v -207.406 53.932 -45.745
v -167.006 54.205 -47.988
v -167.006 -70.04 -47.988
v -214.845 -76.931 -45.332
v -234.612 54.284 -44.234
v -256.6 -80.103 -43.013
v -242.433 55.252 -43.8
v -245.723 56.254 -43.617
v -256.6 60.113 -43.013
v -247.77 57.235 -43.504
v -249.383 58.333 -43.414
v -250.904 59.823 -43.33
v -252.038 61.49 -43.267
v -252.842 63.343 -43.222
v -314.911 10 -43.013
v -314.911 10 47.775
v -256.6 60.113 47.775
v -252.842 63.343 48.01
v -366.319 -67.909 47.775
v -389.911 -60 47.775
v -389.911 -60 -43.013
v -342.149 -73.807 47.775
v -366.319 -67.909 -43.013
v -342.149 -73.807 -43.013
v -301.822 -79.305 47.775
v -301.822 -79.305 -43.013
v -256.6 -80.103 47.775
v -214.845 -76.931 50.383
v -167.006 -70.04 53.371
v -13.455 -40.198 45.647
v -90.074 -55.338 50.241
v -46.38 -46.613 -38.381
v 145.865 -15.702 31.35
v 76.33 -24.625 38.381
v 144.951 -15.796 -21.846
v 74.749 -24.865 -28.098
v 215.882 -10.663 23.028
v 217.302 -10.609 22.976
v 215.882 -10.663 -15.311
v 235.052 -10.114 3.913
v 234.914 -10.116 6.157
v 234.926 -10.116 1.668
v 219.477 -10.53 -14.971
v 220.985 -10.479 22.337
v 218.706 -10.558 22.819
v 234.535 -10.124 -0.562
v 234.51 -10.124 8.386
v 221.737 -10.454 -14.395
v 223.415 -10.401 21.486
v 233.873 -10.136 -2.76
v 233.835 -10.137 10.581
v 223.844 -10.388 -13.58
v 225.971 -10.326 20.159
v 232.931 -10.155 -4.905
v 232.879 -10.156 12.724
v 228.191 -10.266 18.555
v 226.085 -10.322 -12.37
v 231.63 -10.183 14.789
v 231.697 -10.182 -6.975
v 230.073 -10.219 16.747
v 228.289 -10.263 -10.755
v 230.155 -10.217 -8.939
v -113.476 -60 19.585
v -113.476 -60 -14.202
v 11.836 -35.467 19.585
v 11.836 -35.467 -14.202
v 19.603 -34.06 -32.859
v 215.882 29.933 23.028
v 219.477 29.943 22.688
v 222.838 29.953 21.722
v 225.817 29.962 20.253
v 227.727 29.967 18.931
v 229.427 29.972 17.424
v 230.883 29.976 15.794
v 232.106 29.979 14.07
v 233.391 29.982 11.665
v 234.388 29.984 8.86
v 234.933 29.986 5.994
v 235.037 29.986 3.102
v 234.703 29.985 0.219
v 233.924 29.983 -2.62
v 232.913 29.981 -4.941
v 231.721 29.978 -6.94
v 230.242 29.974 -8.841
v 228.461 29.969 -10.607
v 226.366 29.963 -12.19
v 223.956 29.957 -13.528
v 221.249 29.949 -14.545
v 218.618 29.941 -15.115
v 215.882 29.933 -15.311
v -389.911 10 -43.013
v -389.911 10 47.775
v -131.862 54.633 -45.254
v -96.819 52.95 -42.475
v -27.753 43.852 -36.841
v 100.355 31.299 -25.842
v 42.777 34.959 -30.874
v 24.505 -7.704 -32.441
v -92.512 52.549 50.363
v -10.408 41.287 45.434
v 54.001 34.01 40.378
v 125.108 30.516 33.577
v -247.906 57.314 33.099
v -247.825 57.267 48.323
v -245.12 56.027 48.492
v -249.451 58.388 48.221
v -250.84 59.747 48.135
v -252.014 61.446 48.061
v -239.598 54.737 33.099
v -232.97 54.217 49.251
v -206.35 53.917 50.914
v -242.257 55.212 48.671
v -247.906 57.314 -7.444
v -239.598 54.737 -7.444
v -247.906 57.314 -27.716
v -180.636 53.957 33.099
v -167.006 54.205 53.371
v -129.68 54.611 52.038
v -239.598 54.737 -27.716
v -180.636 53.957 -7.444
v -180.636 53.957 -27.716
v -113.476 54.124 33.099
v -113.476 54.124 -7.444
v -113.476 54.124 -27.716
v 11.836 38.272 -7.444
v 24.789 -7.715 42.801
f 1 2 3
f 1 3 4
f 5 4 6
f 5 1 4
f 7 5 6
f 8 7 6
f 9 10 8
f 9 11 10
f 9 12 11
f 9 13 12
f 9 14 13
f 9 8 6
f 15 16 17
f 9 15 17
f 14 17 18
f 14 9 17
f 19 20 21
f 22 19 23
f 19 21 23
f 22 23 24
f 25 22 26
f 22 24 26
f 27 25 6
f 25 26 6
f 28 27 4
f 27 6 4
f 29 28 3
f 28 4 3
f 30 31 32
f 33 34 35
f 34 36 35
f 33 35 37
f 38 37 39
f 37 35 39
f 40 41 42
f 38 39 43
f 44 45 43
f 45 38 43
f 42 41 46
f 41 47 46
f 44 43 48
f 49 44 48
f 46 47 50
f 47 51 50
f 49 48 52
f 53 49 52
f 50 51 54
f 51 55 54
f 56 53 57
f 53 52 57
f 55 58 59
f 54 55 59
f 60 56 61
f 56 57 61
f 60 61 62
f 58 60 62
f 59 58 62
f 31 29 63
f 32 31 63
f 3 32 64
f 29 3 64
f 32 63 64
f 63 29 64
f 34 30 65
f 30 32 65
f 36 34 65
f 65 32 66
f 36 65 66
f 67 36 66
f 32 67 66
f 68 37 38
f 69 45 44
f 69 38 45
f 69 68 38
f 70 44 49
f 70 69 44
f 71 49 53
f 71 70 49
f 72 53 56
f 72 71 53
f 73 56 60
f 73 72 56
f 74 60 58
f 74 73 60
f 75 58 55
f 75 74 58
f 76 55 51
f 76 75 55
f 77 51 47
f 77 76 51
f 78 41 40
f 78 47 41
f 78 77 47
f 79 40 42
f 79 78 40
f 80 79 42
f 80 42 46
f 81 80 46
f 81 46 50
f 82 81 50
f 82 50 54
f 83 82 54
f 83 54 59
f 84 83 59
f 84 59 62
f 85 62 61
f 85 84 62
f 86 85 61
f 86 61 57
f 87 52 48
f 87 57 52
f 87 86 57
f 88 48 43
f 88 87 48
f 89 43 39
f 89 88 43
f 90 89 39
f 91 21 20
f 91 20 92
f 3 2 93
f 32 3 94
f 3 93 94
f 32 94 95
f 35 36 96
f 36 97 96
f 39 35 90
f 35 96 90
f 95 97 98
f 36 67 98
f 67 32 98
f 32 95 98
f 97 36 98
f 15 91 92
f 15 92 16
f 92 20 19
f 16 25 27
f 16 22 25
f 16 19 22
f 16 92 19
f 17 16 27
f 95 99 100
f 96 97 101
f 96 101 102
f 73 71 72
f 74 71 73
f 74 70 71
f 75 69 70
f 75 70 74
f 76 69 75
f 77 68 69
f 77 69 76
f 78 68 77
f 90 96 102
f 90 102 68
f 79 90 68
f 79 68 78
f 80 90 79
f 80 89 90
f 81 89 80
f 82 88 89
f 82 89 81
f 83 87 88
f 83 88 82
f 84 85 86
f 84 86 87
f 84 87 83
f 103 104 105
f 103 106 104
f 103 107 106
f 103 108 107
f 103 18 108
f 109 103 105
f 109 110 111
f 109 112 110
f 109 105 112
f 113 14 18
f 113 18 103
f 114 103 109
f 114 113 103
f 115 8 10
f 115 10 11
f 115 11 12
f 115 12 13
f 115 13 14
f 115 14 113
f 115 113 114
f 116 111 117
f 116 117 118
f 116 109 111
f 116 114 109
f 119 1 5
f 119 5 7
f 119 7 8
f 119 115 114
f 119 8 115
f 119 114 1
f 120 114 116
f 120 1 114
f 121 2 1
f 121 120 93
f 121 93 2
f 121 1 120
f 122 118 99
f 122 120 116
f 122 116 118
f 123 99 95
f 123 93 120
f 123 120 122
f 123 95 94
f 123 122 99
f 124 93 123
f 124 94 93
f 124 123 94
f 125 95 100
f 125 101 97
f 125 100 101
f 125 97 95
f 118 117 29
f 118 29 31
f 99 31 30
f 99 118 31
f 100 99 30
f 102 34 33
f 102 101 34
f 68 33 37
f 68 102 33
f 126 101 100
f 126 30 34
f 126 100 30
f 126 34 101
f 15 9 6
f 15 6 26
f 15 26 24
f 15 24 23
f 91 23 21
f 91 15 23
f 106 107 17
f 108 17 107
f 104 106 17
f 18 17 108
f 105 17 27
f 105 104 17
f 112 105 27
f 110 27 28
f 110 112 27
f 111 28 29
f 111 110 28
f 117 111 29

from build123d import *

# Parameters (mm, degrees)
CUERPOPRINCIPAL_DEPTH      = 80
CUERPOPRINCIPAL_DEPTH_BACK = 80
CROQUIS7_W                 = 766.54141339
CROQUIS7_H                 = 186.814047896
CORTAR_EXTRUIR3_DEPTH      = 424.189661213


with BuildPart() as part:
    # Croquis6 → CuerpoPrincipal (new, two sides: drawn at the far end of the back side and taken through both)
    with BuildSketch(Plane.XY.offset(-CUERPOPRINCIPAL_DEPTH_BACK)):
        with BuildLine():
            Line((-389.911285637, 0), (-389.911285637, 10))
            Line((-389.911285637, 10), (-314.911285637, 10))
            Line((-314.911285637, 10), (-252.842026432, 63.342743249))
            add(Edge.make_bspline(
                [(-252.842026432, 63.342743249), (-249.563571816, 53.509504255), (-229.736767838, 54.456579909), (-175.745984322, 53.062372026), (-106.068484535, 58.585938297), (54.065899345, 26.702801366), (176.576576864, 30.145854915), (260.088714363, 30)],
                knots=[0, 0, 0, 0, 0.061032802, 0.08831328, 0.27280478, 0.517876898, 1, 1, 1, 1], degree=3))
            Line((260.088714363, 30), (260.088714363, 0))
            Line((260.088714363, 0), (260.088714363, -10))
            add(Edge.make_bspline(
                [(-389.911285637, -60), (-298.802521335, -94.939625713), (-162.47070916, -70.499248703), (51.2930938, -26.3000961), (176.665472183, -9.193630881), (260.088714363, -10)],
                knots=[0, 0, 0, 0, 0.425340355, 0.619701838, 1, 1, 1, 1], degree=3))
            Line((-389.911285637, -60), (-389.911285637, 0))
        make_face()
    extrude(amount=CUERPOPRINCIPAL_DEPTH + CUERPOPRINCIPAL_DEPTH_BACK)

    # Croquis7 → Cortar-Extruir3 (cut, through all)
    with BuildSketch(Plane(origin=(0, 63.342743249, 0), x_dir=(1, 0, 0), z_dir=(0, 1, 0))):
        with Locations((-111.935875123, 0)):
            Rectangle(CROQUIS7_W, CROQUIS7_H)
        with BuildLine():
            Line((-256.600146606, -47.774811313), (-393.48095316, -47.774811313))
            Line((-393.48095316, -47.774811313), (-393.48095316, 43.013414242))
            Line((-393.48095316, 43.013414242), (-256.600146606, 43.013414242))
            Line((-256.600146606, 43.013414242), (-167.005663578, 47.988111532))
            add(Edge.make_bspline(
                [(-167.005663578, 47.988111532), (24.572527119, 33.232019495), (215.882298238, 15.311011059)],
                knots=[0, 0, 0, 1, 1, 1], degree=2))
            ThreePointArc((215.882298238, 15.311011059), (235.051976592, -3.858667295), (215.882298238, -23.028345648))
            add(Edge.make_bspline(
                [(-167.005663578, -53.371345765), (25.138803047, -47.402429077), (215.882298238, -23.028345648)],
                knots=[0, 0, 0, 1, 1, 1], degree=2))
            Line((-167.005663578, -53.371345765), (-256.600146606, -47.774811313))
        make_face(mode=Mode.SUBTRACT)
    extrude(amount=-CORTAR_EXTRUIR3_DEPTH, mode=Mode.SUBTRACT)


solid = part.part
